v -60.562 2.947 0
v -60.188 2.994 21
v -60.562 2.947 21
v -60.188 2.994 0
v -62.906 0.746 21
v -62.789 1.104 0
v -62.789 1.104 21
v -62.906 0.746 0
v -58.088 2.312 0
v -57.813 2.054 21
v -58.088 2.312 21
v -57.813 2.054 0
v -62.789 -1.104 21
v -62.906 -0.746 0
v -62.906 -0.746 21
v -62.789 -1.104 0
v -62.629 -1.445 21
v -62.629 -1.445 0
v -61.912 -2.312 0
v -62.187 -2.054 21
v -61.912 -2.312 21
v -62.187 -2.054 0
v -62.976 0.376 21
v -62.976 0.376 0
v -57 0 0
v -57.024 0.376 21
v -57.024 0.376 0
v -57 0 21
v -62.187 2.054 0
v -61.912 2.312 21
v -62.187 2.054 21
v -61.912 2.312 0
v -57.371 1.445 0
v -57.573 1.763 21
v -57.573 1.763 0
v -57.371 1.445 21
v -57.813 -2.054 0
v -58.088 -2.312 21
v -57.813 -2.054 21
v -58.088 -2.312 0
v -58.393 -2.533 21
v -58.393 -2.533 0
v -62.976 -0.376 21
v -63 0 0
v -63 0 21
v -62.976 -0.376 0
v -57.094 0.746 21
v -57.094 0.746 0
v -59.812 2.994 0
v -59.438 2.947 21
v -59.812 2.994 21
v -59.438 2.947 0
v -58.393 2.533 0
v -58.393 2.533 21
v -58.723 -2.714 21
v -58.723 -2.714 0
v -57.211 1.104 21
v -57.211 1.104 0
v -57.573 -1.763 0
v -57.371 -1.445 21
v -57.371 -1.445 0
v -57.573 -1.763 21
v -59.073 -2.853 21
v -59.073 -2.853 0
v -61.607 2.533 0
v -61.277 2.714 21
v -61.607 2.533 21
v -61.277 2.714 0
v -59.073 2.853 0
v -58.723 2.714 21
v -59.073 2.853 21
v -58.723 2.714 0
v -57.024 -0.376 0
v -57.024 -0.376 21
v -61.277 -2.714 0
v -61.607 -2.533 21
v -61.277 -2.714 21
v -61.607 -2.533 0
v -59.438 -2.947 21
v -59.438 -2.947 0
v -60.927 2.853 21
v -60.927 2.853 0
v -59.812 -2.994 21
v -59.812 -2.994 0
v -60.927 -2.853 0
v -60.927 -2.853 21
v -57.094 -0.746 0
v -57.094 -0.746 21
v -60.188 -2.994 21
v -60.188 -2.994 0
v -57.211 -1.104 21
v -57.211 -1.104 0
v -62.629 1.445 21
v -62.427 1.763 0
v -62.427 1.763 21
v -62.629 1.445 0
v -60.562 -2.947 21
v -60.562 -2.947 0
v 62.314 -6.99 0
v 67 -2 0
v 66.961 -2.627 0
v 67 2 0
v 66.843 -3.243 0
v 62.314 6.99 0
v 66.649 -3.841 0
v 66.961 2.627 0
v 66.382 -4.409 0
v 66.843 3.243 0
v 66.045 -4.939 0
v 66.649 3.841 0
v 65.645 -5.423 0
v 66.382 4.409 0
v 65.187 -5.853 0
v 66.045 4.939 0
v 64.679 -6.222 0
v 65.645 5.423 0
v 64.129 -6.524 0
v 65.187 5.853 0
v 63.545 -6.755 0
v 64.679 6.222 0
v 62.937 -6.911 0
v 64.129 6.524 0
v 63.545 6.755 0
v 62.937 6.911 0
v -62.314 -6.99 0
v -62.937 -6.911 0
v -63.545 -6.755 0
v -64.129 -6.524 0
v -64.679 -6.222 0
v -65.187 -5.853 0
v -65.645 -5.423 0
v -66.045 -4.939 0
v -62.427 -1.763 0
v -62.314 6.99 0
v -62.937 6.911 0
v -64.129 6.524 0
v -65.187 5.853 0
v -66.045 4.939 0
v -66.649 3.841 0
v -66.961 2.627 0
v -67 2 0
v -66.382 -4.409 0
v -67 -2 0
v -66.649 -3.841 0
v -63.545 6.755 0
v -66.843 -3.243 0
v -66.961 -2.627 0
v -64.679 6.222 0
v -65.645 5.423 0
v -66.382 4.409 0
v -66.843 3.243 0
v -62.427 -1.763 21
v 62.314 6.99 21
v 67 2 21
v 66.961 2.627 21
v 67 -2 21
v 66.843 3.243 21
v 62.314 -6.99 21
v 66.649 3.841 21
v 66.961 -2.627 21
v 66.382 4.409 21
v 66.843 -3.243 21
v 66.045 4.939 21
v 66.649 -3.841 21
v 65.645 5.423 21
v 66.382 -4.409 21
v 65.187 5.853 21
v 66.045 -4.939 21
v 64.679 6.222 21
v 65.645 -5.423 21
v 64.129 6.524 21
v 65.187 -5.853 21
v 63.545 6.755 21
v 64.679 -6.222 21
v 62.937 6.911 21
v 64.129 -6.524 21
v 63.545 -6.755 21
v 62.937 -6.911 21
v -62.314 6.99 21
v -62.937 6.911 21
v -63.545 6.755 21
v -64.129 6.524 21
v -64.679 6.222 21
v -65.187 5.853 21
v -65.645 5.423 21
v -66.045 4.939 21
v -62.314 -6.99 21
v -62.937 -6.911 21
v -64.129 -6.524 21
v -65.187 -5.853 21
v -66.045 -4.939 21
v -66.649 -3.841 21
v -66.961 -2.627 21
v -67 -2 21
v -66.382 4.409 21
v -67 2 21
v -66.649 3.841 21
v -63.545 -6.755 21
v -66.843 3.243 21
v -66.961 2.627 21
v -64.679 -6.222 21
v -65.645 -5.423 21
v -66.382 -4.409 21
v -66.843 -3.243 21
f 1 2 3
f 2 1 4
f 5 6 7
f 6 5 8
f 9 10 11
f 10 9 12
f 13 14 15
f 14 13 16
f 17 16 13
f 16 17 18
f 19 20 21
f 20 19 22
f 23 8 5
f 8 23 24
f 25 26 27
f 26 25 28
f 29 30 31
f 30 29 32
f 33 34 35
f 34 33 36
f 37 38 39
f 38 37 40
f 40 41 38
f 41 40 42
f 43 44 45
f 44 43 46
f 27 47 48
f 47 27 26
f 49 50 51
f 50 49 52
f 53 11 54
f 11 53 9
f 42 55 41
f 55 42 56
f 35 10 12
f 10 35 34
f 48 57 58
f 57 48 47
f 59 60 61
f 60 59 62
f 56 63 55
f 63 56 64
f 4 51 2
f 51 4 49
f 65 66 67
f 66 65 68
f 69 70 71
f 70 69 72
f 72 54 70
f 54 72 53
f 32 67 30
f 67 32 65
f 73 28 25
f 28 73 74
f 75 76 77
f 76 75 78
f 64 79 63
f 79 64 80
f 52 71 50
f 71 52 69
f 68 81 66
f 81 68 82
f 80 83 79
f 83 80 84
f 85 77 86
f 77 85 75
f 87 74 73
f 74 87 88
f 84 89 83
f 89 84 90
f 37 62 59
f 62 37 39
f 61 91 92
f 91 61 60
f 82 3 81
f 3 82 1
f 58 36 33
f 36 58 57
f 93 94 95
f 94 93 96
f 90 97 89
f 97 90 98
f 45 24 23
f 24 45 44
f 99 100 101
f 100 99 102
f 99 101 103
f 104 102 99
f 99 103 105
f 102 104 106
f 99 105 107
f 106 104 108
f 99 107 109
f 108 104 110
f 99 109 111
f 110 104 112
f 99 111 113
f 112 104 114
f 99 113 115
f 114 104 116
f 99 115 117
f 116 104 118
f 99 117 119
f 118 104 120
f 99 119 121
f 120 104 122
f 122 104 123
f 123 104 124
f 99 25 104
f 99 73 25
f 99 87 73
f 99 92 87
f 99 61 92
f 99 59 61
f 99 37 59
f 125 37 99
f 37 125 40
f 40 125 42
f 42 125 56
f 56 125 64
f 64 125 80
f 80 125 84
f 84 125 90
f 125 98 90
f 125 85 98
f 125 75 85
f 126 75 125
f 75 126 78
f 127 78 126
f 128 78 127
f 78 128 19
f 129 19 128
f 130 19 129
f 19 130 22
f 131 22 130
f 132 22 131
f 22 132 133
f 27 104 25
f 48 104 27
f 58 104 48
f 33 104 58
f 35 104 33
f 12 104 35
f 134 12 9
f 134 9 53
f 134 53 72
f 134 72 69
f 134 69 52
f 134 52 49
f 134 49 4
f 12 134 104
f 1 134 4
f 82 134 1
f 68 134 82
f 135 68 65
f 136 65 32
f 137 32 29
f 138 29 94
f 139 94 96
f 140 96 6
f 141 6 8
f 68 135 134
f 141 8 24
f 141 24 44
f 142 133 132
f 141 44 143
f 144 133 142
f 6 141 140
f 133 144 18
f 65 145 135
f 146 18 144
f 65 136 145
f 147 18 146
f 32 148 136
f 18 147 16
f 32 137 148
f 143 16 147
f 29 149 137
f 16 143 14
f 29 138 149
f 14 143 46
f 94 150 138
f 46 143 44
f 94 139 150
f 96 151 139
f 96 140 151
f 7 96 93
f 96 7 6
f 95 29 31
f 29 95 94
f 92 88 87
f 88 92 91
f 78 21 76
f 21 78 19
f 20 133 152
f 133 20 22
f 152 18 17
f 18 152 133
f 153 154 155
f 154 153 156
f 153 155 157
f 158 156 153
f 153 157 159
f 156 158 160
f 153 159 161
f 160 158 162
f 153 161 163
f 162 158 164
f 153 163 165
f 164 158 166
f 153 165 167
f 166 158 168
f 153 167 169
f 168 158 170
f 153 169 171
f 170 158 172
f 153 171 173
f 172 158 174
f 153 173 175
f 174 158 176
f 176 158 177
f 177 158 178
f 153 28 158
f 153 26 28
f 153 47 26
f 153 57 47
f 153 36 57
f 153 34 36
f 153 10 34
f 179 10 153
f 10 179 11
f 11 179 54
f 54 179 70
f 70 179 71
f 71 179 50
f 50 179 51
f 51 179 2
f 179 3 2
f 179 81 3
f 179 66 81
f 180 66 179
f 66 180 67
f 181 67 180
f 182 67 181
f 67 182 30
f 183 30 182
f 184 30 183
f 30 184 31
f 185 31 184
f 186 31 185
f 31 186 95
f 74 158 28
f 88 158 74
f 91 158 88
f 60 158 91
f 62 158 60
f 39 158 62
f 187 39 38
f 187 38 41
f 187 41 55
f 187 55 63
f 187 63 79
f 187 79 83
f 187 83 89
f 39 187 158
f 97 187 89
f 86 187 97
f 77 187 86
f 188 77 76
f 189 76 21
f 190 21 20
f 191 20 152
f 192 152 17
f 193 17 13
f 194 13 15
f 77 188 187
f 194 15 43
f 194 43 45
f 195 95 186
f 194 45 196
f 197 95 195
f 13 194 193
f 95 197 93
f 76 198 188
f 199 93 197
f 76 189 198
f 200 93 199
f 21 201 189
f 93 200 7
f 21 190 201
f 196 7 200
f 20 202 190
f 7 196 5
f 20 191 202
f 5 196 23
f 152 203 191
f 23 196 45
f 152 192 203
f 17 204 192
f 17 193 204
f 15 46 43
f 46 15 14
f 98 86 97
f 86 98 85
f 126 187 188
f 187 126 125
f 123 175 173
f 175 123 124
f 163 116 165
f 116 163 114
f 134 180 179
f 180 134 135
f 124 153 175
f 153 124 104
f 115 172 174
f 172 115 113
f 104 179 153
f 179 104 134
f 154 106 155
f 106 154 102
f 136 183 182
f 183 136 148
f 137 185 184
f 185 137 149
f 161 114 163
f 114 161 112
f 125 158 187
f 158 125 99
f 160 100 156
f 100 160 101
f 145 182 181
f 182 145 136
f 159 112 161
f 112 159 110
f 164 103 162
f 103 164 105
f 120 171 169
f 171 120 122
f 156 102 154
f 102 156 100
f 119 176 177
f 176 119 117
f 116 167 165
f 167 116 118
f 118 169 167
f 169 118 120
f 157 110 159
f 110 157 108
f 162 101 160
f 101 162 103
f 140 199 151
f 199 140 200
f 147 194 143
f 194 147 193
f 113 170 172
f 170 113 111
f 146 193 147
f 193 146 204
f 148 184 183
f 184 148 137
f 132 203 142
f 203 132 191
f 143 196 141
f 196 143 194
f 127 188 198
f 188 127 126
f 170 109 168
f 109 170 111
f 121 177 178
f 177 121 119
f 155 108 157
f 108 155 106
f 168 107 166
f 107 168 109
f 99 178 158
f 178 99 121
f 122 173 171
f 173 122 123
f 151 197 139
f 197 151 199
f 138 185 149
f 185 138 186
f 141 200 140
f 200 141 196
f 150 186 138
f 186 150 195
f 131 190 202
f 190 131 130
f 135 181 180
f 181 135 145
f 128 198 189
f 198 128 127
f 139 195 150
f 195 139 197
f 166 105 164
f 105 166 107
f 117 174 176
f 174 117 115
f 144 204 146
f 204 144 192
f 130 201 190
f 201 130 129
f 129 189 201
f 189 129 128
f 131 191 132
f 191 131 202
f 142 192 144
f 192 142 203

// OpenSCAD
$fn = 50;


difference() {
	union() {
		hull() {
			translate(v = [-62.0000000000, 2.0000000000, 0]) {
				cylinder(h = 21, r = 5);
			}
			translate(v = [62.0000000000, 2.0000000000, 0]) {
				cylinder(h = 21, r = 5);
			}
			translate(v = [-62.0000000000, -2.0000000000, 0]) {
				cylinder(h = 21, r = 5);
			}
			translate(v = [62.0000000000, -2.0000000000, 0]) {
				cylinder(h = 21, r = 5);
			}
		}
	}
	union() {
		translate(v = [-60.0000000000, 0.0000000000, 0]) {
			cylinder(h = 21, r = 3.0000000000);
		}
		translate(v = [-60.0000000000, 0.0000000000, 0]) {
			cylinder(h = 21, r = 1.5000000000);
		}
		translate(v = [-60.0000000000, 0.0000000000, 0]) {
			cylinder(h = 21, r = 1.5000000000);
		}
		translate(v = [-60.0000000000, 0.0000000000, 0]) {
			cylinder(h = 21, r = 1.5000000000);
		}
	}
}
